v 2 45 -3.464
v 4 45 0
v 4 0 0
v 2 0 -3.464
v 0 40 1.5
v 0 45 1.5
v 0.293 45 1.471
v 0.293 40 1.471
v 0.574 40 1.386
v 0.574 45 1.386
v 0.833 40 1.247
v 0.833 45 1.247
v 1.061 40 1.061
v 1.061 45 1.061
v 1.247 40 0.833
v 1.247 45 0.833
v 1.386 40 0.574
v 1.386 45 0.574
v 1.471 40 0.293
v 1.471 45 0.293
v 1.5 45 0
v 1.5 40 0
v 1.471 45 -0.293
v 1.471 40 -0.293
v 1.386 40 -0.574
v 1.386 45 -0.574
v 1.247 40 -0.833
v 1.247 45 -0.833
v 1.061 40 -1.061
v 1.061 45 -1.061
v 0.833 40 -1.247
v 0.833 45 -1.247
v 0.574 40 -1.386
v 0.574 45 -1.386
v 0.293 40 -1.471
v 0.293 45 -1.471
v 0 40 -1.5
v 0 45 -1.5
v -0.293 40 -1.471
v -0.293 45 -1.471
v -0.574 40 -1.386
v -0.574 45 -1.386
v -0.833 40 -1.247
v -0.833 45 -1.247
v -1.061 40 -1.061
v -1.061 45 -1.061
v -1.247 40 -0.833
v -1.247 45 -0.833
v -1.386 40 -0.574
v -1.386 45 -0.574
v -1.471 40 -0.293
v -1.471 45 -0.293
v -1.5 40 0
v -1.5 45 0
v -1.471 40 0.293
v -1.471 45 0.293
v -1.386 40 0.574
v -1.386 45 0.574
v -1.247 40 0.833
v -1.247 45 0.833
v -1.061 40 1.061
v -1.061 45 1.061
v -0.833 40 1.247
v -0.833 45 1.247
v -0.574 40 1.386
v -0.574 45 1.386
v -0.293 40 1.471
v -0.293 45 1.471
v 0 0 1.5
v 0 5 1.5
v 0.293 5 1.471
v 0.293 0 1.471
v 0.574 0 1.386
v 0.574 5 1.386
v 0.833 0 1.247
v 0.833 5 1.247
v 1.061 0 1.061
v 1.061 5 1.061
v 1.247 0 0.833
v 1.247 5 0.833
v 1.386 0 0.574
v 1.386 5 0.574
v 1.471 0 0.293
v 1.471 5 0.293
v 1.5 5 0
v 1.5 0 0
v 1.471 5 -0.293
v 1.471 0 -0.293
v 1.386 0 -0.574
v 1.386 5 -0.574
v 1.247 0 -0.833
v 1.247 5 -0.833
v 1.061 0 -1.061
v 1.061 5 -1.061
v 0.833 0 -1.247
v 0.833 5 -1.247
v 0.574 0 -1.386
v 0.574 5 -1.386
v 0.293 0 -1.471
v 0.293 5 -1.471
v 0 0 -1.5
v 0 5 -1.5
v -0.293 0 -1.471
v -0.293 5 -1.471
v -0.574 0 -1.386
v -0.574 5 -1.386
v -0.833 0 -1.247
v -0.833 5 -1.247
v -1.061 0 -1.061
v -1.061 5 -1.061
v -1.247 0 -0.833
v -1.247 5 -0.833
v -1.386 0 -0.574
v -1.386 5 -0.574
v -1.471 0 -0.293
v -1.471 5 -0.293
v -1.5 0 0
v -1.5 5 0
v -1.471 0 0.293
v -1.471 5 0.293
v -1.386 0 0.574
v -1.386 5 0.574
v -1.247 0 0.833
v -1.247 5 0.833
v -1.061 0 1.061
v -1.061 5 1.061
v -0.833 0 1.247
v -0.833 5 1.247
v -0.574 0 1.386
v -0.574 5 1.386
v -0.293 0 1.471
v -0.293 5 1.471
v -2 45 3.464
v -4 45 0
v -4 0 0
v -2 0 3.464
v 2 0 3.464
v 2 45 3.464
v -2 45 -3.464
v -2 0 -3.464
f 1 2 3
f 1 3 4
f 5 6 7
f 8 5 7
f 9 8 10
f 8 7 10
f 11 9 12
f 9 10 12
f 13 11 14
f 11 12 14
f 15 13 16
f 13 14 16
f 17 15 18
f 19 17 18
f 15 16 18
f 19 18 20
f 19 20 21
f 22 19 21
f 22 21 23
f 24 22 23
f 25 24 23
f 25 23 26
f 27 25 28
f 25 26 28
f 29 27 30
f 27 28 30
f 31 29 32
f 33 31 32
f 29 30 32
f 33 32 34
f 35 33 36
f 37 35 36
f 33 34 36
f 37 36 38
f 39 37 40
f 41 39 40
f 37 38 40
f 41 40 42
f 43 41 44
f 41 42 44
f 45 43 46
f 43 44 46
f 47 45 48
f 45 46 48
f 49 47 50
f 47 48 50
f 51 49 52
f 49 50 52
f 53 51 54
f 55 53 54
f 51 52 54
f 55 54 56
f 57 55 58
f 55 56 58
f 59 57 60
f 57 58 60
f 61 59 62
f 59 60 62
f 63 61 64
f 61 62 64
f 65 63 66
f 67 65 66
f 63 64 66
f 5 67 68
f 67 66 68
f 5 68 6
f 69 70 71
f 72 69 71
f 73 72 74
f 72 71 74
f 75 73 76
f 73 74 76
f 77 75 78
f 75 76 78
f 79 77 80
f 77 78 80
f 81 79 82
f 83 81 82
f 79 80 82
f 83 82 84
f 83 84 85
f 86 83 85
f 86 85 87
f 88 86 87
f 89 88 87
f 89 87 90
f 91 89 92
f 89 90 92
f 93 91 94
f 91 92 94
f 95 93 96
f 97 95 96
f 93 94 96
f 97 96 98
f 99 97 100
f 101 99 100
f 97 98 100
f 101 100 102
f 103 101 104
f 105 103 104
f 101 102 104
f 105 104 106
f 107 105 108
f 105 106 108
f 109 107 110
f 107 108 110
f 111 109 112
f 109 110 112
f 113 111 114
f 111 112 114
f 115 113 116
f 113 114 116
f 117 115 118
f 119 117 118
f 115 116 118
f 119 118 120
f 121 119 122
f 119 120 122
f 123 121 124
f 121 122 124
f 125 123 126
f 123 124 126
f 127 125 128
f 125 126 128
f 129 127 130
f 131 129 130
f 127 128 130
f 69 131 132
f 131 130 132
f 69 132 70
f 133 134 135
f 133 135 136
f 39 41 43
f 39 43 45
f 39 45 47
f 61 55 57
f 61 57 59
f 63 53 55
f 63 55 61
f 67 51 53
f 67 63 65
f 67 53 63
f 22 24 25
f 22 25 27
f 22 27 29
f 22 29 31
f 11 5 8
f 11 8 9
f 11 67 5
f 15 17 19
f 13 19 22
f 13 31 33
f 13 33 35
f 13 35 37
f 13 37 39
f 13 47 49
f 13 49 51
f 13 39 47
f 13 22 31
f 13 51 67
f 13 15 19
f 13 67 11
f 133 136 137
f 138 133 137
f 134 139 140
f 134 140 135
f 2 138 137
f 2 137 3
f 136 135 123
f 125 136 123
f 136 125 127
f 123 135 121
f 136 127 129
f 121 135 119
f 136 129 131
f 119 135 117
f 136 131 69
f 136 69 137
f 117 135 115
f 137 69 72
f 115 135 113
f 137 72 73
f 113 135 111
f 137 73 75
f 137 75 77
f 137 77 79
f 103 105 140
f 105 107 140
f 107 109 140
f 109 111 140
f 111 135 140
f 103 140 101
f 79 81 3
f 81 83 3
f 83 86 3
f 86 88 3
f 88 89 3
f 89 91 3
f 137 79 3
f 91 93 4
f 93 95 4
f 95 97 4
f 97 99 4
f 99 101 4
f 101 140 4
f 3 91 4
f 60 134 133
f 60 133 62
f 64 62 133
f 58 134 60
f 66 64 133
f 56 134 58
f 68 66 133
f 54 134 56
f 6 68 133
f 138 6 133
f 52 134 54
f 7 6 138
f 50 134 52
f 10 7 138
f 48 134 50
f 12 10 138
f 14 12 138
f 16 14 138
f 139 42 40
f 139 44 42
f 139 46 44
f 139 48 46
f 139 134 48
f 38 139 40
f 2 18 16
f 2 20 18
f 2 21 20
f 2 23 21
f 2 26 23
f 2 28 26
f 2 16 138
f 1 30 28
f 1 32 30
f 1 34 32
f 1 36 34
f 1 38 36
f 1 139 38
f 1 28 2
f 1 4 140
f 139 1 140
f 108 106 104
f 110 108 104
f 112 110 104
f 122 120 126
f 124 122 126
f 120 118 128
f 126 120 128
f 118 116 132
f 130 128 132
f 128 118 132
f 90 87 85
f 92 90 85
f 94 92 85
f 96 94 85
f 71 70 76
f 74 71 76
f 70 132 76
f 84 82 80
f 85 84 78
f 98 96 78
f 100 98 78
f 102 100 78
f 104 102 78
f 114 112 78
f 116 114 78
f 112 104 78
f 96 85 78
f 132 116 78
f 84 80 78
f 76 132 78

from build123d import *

# Parameters (mm, degrees)
EXTRUDE_1_DEPTH        = 45
SKETCH_2_R             = 1.5
CUT_EXTRUDE_1_DEPTH    = 5
PATTERN_LINEAR_1_COUNT = 2
PATTERN_LINEAR_1_PITCH = 40


with BuildPart() as part:
    # 草图1 → 凸台-拉伸1 (new body)
    with BuildSketch(Plane(origin=(0, 0, 0), x_dir=(1, 0, 0), z_dir=(0, 1, 0))):
        Polygon((4, 0), (2, 3.464101615), (-2, 3.464101615), (-4, 0), (-2, -3.464101615), (2, -3.464101615), align=None)
    extrude(amount=EXTRUDE_1_DEPTH)

    # 草图2 → 切除-拉伸1 (cut)
    with BuildSketch(Plane(origin=(0, 45, 0), x_dir=(1, 0, 0), z_dir=(0, 1, 0))):
        with Locations(Location((0, 0, 0), (0, 0, 270))):
            Circle(SKETCH_2_R)
    cut_extrude_1 = extrude(amount=-CUT_EXTRUDE_1_DEPTH, mode=Mode.SUBTRACT)

    # 阵列(线性)1: 切除-拉伸1 ×2
    with Locations(*[(0, -i * PATTERN_LINEAR_1_PITCH, 0) for i in range(1, PATTERN_LINEAR_1_COUNT)]):
        add(cut_extrude_1, mode=Mode.SUBTRACT)


solid = part.part
